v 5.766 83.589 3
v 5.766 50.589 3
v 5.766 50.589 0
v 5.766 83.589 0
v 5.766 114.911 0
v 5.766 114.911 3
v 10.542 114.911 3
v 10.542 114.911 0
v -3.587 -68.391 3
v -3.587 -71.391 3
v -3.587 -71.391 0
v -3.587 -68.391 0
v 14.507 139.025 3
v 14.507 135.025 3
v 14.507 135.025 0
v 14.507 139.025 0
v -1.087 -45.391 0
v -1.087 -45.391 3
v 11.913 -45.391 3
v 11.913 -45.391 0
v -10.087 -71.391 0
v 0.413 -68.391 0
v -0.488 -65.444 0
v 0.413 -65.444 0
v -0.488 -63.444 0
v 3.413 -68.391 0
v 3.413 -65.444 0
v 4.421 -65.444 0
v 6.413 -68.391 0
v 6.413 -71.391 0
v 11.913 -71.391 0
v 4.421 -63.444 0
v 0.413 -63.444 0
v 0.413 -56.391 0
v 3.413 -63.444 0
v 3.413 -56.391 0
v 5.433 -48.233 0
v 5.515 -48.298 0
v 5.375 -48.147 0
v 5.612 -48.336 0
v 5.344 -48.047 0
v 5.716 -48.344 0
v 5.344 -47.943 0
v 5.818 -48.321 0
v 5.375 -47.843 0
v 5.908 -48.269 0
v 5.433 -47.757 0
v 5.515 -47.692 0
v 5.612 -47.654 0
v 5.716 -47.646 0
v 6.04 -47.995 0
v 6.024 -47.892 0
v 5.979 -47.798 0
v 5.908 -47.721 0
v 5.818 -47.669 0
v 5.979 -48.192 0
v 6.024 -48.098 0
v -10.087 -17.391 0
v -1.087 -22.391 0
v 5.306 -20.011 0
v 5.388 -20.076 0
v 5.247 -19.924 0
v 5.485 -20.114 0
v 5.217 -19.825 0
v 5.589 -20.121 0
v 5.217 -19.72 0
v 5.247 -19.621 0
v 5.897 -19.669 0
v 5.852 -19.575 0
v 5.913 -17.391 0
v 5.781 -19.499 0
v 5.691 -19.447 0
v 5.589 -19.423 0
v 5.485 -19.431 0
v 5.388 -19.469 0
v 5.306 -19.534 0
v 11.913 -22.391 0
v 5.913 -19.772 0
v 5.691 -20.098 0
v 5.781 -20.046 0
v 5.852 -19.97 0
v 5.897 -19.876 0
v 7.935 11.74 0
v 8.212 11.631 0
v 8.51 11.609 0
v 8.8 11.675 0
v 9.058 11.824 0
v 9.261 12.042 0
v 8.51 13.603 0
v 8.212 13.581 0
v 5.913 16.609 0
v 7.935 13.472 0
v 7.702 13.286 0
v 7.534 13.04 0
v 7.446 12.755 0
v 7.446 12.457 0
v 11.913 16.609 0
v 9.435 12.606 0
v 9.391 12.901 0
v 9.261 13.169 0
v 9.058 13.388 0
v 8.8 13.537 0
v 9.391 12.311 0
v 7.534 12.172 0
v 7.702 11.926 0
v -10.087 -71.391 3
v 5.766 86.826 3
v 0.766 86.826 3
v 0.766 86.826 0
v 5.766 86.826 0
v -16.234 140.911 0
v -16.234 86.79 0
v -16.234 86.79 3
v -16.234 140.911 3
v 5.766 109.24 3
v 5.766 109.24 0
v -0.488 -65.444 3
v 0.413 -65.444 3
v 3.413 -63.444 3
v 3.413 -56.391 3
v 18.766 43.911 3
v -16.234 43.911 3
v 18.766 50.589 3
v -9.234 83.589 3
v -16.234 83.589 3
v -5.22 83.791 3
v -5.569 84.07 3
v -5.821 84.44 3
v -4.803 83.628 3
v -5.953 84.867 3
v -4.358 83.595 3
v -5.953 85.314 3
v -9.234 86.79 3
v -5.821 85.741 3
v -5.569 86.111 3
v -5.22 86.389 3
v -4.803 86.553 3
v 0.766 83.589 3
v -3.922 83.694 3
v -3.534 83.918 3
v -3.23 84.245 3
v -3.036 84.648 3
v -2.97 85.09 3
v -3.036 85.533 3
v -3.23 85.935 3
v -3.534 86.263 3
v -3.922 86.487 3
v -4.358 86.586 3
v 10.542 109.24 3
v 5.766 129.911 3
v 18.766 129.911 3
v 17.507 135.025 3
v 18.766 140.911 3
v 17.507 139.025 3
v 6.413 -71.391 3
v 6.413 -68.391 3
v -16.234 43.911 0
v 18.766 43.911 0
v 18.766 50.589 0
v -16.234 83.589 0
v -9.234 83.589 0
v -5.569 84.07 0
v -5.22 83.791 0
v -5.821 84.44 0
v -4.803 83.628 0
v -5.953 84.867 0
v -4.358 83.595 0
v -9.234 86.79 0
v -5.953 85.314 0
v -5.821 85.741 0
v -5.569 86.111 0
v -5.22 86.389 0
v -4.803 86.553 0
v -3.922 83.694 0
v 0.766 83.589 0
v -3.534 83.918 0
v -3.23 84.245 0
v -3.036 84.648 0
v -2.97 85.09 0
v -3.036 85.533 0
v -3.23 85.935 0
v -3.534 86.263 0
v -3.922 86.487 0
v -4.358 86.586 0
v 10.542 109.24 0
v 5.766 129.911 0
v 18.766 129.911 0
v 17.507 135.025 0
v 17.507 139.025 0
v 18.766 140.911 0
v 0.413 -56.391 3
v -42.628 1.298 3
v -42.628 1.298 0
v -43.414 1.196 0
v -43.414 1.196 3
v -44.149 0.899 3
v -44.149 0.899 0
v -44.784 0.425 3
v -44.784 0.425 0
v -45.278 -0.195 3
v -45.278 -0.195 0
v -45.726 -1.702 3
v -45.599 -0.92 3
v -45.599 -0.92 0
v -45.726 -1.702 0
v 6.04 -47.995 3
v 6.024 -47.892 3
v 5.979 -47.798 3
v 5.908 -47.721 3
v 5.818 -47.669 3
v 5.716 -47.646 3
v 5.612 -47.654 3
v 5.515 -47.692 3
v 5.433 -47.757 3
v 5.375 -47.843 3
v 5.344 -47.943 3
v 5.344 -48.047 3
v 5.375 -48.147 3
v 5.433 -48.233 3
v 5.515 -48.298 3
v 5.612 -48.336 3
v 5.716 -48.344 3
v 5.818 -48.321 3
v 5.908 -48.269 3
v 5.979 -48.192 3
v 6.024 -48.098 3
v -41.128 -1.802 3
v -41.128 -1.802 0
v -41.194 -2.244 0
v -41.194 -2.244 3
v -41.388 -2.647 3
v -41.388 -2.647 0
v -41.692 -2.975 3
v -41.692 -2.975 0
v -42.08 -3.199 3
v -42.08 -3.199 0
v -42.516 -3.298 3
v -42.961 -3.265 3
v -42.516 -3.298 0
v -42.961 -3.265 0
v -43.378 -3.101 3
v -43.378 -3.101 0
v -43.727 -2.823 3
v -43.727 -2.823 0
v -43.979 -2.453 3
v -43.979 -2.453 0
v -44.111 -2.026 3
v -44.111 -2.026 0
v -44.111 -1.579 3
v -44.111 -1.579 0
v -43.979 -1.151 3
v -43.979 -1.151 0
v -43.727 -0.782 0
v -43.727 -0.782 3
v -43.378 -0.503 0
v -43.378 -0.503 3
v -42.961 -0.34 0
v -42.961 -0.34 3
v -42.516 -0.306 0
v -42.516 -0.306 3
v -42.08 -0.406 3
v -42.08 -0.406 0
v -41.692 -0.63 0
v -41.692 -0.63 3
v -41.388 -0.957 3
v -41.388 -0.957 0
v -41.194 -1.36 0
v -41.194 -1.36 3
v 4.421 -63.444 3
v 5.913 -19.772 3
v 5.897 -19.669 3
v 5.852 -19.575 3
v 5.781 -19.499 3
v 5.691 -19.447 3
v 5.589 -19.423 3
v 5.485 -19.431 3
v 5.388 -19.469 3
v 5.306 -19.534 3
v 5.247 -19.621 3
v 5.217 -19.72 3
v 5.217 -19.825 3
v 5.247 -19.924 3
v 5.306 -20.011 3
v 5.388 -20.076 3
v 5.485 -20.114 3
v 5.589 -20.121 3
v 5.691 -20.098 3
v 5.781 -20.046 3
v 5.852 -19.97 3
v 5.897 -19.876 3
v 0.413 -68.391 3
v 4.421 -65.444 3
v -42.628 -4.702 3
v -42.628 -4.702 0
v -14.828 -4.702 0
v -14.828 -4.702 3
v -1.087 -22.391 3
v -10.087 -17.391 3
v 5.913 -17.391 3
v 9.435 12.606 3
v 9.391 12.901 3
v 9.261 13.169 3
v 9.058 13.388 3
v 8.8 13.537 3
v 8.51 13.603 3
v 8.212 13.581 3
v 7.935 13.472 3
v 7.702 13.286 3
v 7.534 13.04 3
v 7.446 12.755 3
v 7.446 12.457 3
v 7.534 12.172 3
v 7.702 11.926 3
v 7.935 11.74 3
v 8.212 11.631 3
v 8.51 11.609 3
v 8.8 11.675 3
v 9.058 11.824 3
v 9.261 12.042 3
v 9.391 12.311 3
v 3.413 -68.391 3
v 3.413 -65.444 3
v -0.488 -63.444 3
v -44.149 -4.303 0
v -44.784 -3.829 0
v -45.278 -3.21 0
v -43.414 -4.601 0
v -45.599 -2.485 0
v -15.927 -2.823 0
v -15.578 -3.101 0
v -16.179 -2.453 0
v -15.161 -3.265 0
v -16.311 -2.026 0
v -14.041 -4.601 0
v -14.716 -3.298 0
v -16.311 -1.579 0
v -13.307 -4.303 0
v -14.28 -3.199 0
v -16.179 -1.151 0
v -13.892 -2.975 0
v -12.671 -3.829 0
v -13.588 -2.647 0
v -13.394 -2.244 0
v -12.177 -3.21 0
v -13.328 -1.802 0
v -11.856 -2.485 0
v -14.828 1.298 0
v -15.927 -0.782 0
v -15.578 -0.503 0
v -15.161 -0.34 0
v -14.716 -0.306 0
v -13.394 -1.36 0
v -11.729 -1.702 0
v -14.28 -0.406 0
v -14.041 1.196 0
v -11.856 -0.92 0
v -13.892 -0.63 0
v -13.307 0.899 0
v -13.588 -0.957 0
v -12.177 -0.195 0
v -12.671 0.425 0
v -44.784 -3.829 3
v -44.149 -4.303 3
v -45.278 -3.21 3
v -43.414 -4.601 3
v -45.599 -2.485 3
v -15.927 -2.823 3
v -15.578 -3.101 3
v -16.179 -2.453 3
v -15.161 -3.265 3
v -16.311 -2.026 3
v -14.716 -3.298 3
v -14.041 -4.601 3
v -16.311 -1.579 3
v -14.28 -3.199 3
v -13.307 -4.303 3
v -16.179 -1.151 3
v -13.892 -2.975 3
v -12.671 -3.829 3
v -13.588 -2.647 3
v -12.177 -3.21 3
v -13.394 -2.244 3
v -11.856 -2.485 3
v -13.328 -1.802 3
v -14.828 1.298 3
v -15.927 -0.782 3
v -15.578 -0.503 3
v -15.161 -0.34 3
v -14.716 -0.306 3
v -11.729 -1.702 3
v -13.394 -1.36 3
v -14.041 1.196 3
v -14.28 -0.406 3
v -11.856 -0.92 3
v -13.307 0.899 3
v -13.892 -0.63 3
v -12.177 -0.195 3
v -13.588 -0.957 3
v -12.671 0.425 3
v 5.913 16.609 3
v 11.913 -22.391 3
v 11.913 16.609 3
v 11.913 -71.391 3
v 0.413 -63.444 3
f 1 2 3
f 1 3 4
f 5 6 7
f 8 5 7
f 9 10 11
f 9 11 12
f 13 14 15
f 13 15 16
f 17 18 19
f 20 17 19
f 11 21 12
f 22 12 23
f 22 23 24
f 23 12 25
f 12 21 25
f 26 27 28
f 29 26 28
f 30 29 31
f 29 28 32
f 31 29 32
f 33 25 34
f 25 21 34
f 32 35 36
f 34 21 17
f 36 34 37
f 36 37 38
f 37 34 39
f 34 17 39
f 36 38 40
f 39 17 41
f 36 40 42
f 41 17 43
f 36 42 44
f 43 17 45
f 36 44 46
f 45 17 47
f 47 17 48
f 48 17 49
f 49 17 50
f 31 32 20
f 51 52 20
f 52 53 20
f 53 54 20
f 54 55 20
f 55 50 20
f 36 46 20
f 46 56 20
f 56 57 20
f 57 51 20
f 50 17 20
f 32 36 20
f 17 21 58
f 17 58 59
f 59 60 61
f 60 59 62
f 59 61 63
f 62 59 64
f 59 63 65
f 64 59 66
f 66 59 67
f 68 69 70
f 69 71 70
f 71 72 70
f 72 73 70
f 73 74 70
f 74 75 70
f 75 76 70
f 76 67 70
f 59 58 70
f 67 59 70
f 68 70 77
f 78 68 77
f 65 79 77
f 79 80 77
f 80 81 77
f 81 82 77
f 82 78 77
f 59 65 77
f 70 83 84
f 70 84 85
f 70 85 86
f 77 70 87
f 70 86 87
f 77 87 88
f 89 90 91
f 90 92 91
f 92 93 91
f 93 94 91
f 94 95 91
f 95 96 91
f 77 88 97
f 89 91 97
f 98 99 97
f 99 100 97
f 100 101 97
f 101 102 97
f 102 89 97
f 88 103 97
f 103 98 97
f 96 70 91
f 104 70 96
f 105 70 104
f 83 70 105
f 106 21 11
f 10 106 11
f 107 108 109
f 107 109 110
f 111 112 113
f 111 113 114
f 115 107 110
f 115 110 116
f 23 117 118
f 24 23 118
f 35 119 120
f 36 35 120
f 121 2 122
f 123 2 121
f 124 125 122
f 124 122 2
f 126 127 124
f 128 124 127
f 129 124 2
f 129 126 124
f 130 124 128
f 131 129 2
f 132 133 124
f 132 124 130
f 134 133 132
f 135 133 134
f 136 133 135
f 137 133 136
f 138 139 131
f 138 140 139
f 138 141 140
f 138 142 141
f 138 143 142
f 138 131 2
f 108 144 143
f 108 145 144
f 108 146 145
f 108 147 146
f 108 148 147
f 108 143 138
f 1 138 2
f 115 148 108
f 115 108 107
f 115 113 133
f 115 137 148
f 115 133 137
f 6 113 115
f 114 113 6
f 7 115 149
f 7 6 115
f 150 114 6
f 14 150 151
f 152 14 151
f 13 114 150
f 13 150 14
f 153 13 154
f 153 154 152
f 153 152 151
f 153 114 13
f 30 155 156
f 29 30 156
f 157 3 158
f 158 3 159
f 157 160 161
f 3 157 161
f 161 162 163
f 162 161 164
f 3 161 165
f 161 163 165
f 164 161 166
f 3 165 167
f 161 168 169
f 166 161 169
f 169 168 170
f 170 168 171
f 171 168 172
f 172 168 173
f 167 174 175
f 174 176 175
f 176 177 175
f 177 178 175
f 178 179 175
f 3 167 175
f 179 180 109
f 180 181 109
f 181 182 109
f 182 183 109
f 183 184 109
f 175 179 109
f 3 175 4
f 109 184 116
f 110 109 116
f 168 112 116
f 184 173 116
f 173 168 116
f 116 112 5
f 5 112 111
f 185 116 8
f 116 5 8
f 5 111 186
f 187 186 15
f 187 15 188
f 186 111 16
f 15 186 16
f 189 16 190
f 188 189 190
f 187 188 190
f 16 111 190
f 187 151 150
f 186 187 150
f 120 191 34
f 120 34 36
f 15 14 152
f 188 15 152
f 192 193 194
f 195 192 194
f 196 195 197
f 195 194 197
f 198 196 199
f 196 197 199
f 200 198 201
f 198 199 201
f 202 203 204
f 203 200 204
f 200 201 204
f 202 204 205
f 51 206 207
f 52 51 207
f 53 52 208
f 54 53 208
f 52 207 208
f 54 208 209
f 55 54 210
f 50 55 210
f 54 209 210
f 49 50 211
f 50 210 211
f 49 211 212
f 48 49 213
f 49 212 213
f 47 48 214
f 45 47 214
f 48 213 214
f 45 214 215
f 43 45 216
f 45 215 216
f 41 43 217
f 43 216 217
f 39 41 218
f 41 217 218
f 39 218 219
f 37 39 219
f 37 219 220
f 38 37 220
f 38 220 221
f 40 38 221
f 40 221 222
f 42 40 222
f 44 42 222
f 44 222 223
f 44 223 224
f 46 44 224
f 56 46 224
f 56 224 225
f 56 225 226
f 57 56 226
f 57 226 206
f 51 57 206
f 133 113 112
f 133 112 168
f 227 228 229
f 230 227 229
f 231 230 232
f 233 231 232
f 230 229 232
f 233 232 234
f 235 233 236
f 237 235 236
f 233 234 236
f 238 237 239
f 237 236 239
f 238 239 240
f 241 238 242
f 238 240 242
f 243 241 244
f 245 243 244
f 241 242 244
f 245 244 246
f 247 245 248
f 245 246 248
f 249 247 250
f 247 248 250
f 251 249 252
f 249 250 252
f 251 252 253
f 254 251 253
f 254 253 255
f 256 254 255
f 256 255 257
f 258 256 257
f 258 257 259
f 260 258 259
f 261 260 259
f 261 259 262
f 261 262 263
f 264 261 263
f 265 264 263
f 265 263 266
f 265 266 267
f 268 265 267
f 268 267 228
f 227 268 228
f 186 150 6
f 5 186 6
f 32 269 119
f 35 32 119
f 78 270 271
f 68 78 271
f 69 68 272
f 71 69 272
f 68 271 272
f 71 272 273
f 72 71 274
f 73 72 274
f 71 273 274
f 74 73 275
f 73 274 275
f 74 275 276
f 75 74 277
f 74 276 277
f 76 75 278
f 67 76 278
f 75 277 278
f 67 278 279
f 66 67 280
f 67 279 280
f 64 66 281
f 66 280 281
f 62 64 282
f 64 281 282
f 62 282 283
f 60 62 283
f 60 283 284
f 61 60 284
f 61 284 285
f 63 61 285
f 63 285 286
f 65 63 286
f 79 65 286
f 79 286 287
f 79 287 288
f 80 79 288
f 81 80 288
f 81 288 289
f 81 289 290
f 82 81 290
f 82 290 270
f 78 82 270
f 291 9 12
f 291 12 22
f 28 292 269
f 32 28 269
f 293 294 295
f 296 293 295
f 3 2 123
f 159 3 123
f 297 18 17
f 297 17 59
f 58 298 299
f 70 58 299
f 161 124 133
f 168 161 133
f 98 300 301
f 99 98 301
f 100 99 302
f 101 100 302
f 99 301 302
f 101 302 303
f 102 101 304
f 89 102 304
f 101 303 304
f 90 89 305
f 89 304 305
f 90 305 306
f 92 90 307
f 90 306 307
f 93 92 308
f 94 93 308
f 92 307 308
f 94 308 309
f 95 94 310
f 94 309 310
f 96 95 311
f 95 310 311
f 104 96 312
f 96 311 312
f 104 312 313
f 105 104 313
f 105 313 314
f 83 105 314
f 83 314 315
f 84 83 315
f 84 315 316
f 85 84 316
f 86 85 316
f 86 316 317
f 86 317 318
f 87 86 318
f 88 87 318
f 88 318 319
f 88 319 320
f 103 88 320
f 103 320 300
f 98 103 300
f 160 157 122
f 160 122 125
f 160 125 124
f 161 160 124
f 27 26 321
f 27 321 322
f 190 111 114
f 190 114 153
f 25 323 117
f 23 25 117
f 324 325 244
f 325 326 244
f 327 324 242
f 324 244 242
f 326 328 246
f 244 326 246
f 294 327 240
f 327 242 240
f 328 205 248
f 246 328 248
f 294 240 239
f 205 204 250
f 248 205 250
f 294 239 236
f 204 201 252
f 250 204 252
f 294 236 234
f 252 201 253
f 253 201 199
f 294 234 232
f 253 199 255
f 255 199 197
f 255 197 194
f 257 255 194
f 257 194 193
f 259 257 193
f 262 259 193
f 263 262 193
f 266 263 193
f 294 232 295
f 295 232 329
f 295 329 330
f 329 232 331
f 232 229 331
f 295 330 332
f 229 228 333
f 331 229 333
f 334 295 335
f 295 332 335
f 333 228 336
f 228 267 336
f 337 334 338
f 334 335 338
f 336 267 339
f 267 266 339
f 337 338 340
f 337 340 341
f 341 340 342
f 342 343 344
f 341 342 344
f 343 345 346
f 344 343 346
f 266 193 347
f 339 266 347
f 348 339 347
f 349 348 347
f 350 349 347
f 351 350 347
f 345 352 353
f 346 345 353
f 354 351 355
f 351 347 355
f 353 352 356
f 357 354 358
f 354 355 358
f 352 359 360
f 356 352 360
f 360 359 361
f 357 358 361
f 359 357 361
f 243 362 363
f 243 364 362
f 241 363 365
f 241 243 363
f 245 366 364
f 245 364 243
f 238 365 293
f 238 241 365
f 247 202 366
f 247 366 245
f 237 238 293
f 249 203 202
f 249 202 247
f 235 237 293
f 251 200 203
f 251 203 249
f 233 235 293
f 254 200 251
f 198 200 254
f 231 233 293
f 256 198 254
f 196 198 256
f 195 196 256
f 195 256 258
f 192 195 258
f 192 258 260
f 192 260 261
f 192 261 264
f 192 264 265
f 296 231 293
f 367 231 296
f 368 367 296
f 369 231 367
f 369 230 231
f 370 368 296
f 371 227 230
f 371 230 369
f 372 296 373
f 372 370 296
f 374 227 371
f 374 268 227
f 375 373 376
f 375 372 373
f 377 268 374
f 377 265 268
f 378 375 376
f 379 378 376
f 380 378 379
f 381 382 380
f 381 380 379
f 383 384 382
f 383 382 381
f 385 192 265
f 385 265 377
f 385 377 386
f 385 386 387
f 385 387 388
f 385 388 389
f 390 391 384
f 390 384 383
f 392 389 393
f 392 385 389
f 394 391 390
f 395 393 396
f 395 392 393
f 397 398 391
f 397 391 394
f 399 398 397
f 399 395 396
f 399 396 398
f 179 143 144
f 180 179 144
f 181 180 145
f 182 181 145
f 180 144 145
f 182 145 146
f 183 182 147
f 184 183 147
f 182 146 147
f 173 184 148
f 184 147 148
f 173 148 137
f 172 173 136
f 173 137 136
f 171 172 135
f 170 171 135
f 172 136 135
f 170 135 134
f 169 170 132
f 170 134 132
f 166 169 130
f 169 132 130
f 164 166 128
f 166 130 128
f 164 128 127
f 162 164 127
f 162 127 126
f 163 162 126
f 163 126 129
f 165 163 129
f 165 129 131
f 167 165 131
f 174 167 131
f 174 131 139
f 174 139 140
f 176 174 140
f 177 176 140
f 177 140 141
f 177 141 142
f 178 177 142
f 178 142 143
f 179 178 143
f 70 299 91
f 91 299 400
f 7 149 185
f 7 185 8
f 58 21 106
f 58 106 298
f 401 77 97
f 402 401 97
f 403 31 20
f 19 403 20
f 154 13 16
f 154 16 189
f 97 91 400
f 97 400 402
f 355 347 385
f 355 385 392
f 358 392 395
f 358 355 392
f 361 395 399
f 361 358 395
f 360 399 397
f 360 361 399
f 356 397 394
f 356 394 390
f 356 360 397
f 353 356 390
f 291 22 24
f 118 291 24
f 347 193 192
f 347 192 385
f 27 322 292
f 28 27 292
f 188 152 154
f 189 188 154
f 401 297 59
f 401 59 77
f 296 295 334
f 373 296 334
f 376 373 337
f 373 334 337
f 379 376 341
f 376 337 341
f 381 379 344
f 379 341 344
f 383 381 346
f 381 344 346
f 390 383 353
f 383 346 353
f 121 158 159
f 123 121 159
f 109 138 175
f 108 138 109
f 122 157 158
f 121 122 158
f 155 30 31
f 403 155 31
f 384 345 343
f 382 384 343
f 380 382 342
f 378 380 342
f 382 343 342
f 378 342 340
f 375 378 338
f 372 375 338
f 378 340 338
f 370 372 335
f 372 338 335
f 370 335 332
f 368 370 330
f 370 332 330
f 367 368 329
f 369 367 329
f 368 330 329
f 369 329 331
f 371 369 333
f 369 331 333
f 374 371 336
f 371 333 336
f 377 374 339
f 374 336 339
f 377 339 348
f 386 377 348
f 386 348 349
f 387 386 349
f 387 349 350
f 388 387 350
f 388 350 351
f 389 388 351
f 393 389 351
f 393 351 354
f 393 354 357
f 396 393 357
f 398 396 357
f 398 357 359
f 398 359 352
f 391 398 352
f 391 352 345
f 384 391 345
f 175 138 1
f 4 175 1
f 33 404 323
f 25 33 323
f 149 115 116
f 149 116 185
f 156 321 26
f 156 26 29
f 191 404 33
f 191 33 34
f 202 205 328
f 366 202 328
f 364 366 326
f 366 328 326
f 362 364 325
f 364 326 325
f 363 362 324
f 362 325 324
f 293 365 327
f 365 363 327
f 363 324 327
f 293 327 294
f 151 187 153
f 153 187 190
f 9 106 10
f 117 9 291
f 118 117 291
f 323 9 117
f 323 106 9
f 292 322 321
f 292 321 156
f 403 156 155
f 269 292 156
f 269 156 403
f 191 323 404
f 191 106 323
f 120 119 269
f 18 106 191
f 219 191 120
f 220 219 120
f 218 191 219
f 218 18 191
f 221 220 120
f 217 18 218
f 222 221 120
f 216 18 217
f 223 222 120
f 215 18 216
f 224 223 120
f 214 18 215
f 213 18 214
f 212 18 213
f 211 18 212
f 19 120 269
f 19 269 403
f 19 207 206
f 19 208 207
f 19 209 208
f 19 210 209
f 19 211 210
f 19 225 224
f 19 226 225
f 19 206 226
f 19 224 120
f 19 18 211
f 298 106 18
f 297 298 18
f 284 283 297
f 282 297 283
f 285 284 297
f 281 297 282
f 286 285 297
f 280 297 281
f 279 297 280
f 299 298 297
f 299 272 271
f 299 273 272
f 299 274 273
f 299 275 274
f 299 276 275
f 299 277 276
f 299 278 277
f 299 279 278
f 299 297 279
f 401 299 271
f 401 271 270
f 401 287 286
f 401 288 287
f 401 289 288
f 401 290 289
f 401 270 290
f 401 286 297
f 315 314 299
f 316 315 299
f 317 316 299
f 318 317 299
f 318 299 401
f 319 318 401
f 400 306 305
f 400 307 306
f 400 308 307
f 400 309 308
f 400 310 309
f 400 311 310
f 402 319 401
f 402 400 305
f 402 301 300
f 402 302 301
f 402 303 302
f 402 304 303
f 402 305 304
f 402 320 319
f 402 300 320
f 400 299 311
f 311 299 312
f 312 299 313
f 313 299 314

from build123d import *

# Parameters (mm, degrees)
F0_W        = 34
F0_H        = 6
F1_DEPTH    = 3
F2_T1_DEPTH = 18.5
F3_T1_DEPTH = 18.5
F4_R        = 1.5
F5_DEPTH    = 25.8
F6_W        = 35
F6_H        = 97
F7_DEPTH    = 3
F9_DEPTH    = 65
F10_W       = 13
F10_H       = 58.6508959532
F11_DEPTH   = 25
F12_W       = 5
F12_H       = 3.23662889
F12_W_2     = 7
F12_H_2     = 3.2004637718
F13_DEPTH   = 35.3
F14_R       = 1.5
F15_DEPTH   = 25
F16_W       = 8.2240308821
F16_H       = 5.6709373705
F16_W_2     = 3
F16_H_2     = 4
F17_DEPTH   = 25
F18_W       = 22
F18_H       = 88
F19_DEPTH   = 3
F20_W       = 16
F20_H       = 34
F21_DEPTH   = 14.5
F22_W       = 13
F22_H       = 23
F23_DEPTH   = 25
F24_W       = 10
F24_H       = 3
F25_DEPTH   = 25
F26_W       = 3
F26_H       = 12
F27_DEPTH   = 25
F29_DEPTH   = 25
F30_R       = 1
F30_R_2     = 0.35
F31_DEPTH   = 25


# Not quite as in the source:
# - a fillet or chamfer that OpenCascade refuses, or shapes differently, is made with other operations: its cross-section is extruded or revolved along the edge and cut away or added


with BuildPart() as f1:
    # F0 (on Top) → F1 (new body)
    with BuildSketch(Plane.XY):
        with Locations((-28.7276850939, -1.7022728249)):
            Rectangle(F0_W, F0_H)
    extrude(amount=F1_DEPTH)

    # F2: fillet of radius 3.1 on 2 edges, made by hand

    # F2_s2 → F2_t1 (cut)
    with BuildSketch(Plane.XY.offset(-7.75)):
        with BuildLine():
            ThreePointArc((-14.8276850939, -4.7022728249), (-12.6356540722, -3.7943038466), (-11.7276850939, -1.6022728249))
            Line((-11.7276850939, -1.6022728249), (-11.7276850939, -4.7022728249))
            Line((-11.7276850939, -4.7022728249), (-14.8276850939, -4.7022728249))
        make_face()
        with BuildLine():
            ThreePointArc((-14.8276850939, 1.2977271751), (-12.6356540722, 0.3897581967), (-11.7276850939, -1.8022728249))
            Line((-11.7276850939, -1.8022728249), (-11.7276850939, 1.2977271751))
            Line((-11.7276850939, 1.2977271751), (-14.8276850939, 1.2977271751))
        make_face()
    extrude(amount=F2_T1_DEPTH, mode=Mode.SUBTRACT)

    # F3: fillet of radius 3.1 on 2 edges, made by hand

    # F3_s2 → F3_t1 (cut)
    with BuildSketch(Plane.XY.offset(-7.75)):
        with BuildLine():
            ThreePointArc((-45.7276850939, -1.6022728249), (-44.8197161156, -3.7943038466), (-42.6276850939, -4.7022728249))
            Line((-42.6276850939, -4.7022728249), (-45.7276850939, -4.7022728249))
            Line((-45.7276850939, -4.7022728249), (-45.7276850939, -1.6022728249))
        make_face()
        with BuildLine():
            ThreePointArc((-42.6276850939, 1.2977271751), (-44.8197161156, 0.3897581967), (-45.7276850939, -1.8022728249))
            Line((-45.7276850939, -1.8022728249), (-45.7276850939, 1.2977271751))
            Line((-45.7276850939, 1.2977271751), (-42.6276850939, 1.2977271751))
        make_face()
    extrude(amount=F3_T1_DEPTH, mode=Mode.SUBTRACT)

    # F4 (on face) → F5 (cut)
    with BuildSketch(Plane(origin=(0, 0, 0), x_dir=(1, 0, 0), z_dir=(0, 0, -1))):
        with Locations((-42.6276850939, 1.8022728249)):
            Circle(F4_R)
        with Locations((-14.8276850939, 1.8022728249)):
            Circle(F4_R)
    extrude(amount=-F5_DEPTH, mode=Mode.SUBTRACT)


with BuildPart() as f7:
    # F6 (on Top) → F7 (new body)
    with BuildSketch(Plane.XY):
        with Locations((1.2659030035, 92.4109403007)):
            Rectangle(F6_W, F6_H)
    extrude(amount=F7_DEPTH)

    # F8 (on face) → F9 (cut)
    with BuildSketch(Plane.XY.offset(3)):
        Polygon((18.7659030035, 114.9109403007), (18.7659030035, 129.9109403007), (14.4255761913, 129.9109403007), (5.7659030035, 129.9109403007), (5.7659030035, 114.9109403007), align=None)
    extrude(amount=-F9_DEPTH, mode=Mode.SUBTRACT)

    # F10 (on face) → F11 (cut)
    with BuildSketch(Plane.XY.offset(3)):
        with Locations((12.2659030035, 79.9145549536)):
            Rectangle(F10_W, F10_H)
    extrude(amount=-F11_DEPTH, mode=Mode.SUBTRACT)

    # F12 (on face) → F13 (cut)
    with BuildSketch(Plane.XY.offset(3)):
        with Locations((3.2659030035, 85.207421422)):
            Rectangle(F12_W, F12_H)
        with Locations((-12.7340969965, 85.1893388629)):
            Rectangle(F12_W_2, F12_H_2)
    extrude(amount=-F13_DEPTH, mode=Mode.SUBTRACT)

    # F14 (on face) → F15 (cut)
    with BuildSketch(Plane.XY.offset(3)):
        with Locations((-4.4696778059, 85.0904509425)):
            Circle(F14_R)
    extrude(amount=-F15_DEPTH, mode=Mode.SUBTRACT)

    # F16 (on face) → F17 (cut)
    with BuildSketch(Plane.XY.offset(3)):
        with Locations((14.6538875625, 112.0754716154)):
            Rectangle(F16_W, F16_H)
        with Locations((16.0067553967, 137.0250095129)):
            Rectangle(F16_W_2, F16_H_2)
    extrude(amount=-F17_DEPTH, mode=Mode.SUBTRACT)


with BuildPart() as f19:
    # F18 (on Top) → F19 (new body)
    with BuildSketch(Plane.XY):
        with Locations((0.9128389647, -27.3907984654)):
            Rectangle(F18_W, F18_H)
    extrude(amount=F19_DEPTH)

    # F20 (on face) → F21 (cut)
    with BuildSketch(Plane.XY.offset(3)):
        with Locations((-2.0871610353, -0.3907984654)):
            Rectangle(F20_W, F20_H)
    extrude(amount=-F21_DEPTH, mode=Mode.SUBTRACT)

    # F22 (on face) → F23 (cut)
    with BuildSketch(Plane.XY.offset(3)):
        with Locations((5.4128389647, -33.8907984654)):
            Rectangle(F22_W, F22_H)
    extrude(amount=-F23_DEPTH, mode=Mode.SUBTRACT)

    # F24 (on face) → F25 (cut)
    with BuildSketch(Plane.XY.offset(3)):
        with Locations((1.4128389647, -69.8907984654)):
            Rectangle(F24_W, F24_H)
    extrude(amount=-F25_DEPTH, mode=Mode.SUBTRACT)

    # F26 (on face) → F27 (cut)
    with BuildSketch(Plane.XY.offset(3)):
        with Locations((1.9128389647, -62.3907984654)):
            Rectangle(F26_W, F26_H)
    extrude(amount=-F27_DEPTH, mode=Mode.SUBTRACT)

    # F28 (on face) → F29 (cut)
    with BuildSketch(Plane.XY.offset(3)):
        Polygon((-0.4876649764, -63.4444471002), (-0.4876649764, -65.4444471002), (0.4128389647, -65.4444471002), (4.4208336622, -65.4444471002), (4.4208336622, -63.4444471002), align=None)
    extrude(amount=-F29_DEPTH, mode=Mode.SUBTRACT)

    # F30 (on face) → F31 (cut)
    with BuildSketch(Plane.XY.offset(3)):
        with Locations((8.4350015968, 12.605776079)):
            Circle(F30_R)
        with Locations((5.5628389647, -19.772477448)):
            Circle(F30_R_2)
        with Locations((5.6899152696, -47.9949377477)):
            Circle(F30_R_2)
    extrude(amount=-F31_DEPTH, mode=Mode.SUBTRACT)


solid = Compound([f1.part, f7.part, f19.part])
